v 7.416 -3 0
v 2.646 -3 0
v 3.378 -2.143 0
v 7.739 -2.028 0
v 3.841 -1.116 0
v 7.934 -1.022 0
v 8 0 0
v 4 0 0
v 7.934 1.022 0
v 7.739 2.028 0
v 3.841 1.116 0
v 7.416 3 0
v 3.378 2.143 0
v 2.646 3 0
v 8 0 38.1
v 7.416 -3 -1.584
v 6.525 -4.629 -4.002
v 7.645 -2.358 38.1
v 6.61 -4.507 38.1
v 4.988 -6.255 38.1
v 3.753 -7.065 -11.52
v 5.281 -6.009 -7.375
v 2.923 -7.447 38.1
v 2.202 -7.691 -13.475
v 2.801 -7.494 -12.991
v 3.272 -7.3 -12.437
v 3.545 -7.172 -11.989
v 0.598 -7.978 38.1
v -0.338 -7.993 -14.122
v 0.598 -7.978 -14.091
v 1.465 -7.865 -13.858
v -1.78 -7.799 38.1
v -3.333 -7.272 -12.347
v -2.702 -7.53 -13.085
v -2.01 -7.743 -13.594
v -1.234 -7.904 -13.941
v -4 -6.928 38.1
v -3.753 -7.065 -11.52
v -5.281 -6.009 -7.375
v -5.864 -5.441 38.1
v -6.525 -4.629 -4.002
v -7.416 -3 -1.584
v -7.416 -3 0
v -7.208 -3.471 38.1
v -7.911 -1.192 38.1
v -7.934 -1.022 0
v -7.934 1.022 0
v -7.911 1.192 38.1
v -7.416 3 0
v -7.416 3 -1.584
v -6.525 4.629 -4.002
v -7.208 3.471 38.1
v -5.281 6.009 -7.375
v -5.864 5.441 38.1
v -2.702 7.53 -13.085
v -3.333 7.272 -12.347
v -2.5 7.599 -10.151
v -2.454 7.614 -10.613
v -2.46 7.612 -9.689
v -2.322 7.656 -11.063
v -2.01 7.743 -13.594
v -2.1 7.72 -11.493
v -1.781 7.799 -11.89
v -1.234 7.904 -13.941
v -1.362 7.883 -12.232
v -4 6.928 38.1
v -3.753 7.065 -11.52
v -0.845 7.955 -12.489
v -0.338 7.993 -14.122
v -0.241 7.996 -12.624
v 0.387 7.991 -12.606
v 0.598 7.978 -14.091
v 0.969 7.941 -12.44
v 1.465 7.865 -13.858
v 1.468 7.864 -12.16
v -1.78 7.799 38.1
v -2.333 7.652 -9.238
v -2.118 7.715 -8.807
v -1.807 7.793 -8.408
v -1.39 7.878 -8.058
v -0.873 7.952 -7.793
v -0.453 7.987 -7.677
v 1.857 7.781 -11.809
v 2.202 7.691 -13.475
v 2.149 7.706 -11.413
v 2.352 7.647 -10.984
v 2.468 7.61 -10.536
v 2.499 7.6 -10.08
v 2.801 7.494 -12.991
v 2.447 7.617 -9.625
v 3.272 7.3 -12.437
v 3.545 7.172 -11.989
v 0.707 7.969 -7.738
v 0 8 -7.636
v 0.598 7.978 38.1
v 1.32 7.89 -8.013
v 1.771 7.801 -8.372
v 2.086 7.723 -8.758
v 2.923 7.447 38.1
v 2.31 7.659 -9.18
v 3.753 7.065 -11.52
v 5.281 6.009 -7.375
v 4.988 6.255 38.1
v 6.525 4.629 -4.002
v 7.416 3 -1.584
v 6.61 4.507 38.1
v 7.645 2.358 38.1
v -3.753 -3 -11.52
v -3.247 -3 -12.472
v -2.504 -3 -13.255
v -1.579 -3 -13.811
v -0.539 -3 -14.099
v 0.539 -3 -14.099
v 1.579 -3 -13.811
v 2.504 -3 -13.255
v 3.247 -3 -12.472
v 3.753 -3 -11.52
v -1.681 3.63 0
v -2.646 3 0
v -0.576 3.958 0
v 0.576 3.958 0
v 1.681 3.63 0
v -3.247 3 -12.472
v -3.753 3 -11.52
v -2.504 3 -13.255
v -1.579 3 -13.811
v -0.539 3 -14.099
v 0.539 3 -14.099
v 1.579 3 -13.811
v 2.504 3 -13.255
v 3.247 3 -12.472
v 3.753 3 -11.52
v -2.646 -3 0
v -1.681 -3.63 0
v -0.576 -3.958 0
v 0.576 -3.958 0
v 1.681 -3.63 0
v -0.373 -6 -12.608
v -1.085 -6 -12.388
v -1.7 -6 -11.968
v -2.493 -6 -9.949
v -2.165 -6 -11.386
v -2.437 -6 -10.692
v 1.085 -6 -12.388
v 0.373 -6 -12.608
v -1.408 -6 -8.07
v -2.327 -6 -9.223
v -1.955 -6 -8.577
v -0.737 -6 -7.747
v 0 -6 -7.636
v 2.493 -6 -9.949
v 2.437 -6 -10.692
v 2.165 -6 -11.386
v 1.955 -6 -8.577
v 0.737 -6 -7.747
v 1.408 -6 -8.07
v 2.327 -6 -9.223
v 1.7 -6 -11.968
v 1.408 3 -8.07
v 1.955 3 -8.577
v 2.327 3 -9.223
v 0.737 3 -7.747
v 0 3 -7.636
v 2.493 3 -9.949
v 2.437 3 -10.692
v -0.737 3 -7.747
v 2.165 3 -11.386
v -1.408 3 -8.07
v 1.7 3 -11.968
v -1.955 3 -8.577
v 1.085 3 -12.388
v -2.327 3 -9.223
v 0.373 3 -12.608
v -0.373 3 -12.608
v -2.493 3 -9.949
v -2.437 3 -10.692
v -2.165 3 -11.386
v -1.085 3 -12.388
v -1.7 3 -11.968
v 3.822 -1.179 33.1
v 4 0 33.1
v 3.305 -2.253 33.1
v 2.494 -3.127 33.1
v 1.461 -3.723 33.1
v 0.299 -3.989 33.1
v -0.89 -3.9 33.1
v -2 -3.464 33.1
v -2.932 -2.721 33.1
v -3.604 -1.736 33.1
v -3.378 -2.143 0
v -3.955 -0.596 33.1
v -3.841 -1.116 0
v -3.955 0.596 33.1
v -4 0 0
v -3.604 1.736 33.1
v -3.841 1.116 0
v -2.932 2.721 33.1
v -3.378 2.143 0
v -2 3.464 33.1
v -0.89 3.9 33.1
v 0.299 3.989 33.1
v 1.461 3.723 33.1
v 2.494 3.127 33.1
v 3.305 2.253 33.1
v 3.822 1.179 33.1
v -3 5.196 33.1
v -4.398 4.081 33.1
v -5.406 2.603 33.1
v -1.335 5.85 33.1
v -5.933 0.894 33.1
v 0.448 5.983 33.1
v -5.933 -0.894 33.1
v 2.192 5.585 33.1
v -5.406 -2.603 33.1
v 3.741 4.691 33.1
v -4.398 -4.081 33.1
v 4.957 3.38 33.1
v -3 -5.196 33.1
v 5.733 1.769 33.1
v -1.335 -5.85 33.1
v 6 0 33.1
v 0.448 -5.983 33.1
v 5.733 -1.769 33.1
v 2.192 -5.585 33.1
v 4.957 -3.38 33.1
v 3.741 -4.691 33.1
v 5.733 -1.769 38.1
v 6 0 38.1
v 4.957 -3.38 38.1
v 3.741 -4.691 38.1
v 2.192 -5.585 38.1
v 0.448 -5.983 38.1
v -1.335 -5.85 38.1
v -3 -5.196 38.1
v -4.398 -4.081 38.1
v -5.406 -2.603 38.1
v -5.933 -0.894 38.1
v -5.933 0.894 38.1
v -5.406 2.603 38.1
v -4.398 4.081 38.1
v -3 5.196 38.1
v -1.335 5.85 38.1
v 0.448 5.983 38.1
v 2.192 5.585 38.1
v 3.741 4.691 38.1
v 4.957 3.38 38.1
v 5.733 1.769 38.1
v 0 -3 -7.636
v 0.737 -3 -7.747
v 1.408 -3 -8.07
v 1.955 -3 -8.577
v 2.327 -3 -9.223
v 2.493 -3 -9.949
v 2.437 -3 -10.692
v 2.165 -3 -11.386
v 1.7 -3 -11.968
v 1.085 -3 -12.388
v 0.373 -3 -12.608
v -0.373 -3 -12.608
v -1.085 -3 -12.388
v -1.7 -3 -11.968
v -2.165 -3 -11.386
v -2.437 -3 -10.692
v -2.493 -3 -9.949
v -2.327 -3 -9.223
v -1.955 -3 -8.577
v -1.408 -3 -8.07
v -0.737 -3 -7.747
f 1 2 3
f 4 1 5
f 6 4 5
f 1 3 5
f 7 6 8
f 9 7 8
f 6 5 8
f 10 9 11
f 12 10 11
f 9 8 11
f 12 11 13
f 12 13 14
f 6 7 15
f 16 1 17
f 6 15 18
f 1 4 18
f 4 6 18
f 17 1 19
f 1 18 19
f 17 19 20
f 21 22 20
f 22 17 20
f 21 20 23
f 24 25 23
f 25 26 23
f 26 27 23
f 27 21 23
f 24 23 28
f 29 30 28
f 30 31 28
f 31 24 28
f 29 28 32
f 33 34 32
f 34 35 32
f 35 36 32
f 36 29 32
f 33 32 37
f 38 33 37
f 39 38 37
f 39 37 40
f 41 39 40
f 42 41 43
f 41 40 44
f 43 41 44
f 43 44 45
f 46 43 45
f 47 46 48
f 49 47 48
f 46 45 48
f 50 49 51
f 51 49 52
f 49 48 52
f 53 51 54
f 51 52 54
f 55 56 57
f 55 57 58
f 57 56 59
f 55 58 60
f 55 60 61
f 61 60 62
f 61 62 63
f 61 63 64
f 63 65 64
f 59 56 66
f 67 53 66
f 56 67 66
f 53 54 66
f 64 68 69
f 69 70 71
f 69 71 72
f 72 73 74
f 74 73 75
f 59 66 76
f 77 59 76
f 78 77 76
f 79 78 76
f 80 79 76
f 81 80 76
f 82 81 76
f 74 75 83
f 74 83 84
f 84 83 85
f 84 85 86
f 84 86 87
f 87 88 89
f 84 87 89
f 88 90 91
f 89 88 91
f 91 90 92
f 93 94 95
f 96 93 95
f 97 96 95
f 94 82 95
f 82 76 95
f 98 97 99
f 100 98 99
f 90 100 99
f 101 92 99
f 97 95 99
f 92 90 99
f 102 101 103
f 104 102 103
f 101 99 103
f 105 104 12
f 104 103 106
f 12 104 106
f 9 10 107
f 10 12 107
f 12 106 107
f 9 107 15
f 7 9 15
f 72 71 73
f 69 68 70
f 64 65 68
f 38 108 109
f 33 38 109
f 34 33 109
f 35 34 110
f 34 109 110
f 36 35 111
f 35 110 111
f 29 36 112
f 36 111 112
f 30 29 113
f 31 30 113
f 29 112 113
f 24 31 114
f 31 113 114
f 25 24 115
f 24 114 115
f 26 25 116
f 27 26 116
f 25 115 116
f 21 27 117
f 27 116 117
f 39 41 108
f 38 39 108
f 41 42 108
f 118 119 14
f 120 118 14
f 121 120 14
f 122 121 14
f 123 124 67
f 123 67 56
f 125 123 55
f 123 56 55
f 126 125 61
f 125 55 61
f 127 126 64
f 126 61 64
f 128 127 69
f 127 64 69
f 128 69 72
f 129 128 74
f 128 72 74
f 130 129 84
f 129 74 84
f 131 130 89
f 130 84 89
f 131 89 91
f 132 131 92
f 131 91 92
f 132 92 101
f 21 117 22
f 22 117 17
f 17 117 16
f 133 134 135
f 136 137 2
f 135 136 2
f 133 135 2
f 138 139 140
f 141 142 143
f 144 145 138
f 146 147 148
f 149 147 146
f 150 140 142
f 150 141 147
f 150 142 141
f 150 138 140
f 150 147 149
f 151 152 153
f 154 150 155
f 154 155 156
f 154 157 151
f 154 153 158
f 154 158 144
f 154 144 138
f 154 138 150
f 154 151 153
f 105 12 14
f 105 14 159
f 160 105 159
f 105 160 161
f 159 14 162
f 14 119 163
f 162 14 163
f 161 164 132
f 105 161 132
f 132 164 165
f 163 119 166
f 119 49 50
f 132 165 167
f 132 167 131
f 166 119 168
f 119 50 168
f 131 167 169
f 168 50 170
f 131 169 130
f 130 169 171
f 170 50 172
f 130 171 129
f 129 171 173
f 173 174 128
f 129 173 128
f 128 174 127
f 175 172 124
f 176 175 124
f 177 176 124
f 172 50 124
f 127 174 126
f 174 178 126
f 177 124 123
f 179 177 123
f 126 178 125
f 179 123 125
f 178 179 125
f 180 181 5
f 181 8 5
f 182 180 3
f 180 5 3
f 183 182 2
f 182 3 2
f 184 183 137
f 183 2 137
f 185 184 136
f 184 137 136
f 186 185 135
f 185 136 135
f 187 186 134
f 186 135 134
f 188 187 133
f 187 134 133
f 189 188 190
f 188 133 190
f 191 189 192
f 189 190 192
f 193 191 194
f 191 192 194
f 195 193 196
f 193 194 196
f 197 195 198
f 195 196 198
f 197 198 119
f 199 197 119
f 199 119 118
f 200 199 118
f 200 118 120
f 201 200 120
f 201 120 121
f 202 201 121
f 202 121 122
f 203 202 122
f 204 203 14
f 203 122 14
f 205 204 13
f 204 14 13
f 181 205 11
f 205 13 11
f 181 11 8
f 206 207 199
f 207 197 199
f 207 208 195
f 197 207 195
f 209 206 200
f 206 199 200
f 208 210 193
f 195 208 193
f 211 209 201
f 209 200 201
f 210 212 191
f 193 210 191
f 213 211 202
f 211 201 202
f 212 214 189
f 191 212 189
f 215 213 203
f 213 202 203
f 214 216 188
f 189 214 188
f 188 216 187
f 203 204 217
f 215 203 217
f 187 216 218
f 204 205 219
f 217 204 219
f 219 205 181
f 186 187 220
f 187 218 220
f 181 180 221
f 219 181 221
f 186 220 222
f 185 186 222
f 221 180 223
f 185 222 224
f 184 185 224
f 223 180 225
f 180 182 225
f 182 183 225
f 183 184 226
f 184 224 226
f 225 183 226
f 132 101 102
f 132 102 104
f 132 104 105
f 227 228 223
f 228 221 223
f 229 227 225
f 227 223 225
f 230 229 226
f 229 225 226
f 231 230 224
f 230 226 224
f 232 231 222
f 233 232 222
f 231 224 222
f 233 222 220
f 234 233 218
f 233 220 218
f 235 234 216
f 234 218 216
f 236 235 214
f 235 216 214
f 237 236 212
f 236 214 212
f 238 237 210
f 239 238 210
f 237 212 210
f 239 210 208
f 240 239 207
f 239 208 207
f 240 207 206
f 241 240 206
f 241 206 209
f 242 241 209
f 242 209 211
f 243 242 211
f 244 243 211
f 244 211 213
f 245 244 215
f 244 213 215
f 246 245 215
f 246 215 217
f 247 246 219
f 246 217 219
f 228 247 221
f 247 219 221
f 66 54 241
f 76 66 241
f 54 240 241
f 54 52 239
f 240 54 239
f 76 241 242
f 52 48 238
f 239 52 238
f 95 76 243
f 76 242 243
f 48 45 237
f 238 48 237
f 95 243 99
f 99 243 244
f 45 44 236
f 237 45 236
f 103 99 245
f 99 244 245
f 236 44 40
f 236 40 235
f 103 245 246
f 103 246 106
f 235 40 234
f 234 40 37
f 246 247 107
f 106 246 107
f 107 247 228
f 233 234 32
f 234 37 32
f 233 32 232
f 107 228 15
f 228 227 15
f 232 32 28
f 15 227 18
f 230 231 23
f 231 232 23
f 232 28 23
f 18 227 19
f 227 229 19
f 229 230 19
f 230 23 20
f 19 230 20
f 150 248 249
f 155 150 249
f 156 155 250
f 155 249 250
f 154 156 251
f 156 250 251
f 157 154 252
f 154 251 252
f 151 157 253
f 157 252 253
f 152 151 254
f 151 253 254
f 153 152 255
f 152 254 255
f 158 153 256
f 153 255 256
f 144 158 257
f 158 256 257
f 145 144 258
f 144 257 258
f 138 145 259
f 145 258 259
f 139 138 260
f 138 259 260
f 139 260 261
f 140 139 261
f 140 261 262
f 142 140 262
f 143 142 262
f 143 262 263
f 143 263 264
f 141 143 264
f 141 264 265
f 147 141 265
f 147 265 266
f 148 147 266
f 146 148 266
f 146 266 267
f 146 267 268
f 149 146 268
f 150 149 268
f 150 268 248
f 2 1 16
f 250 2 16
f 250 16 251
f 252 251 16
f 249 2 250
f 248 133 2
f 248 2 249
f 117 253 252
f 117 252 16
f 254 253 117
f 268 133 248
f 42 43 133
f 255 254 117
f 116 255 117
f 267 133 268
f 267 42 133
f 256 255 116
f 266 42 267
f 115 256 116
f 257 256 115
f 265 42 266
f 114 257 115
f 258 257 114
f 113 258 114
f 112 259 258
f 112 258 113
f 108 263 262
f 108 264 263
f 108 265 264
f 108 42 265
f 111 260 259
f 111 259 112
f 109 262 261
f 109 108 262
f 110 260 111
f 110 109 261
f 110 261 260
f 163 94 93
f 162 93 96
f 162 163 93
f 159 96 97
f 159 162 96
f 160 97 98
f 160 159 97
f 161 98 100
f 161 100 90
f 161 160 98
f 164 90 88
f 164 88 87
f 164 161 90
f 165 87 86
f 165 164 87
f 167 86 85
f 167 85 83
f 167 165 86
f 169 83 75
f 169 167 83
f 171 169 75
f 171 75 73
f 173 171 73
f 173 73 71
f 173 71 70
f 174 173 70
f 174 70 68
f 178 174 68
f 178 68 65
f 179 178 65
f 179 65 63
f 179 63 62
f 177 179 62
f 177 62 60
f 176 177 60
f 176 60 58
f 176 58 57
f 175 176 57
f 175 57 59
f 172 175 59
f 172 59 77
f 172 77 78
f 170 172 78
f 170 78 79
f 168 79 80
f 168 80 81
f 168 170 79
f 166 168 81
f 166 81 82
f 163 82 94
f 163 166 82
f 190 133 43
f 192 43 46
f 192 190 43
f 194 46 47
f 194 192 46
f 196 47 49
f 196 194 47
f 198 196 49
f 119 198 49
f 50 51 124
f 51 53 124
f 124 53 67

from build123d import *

# Parameters (mm, degrees)
CUT_EXTRUDE2_DEPTH      = 40.744307769
CUT_EXTRUDE2_DEPTH_BACK = 40.744307769
SKETCH4_W               = 25.011127608
SKETCH4_H               = 6
CUT_EXTRUDE3_DEPTH      = 40.744307905
CUT_EXTRUDE3_DEPTH_BACK = 40.744307905
SKETCH3_4_R             = 2.5
CUT_EXTRUDE4_DEPTH      = 40.744307905
CUT_EXTRUDE4_DEPTH_BACK = 6


with BuildPart() as part:
    # Sketch2 → Revolve1 (revolve)
    with BuildSketch(Plane(origin=(0, 0, 0), x_dir=(0, 0, -1), z_dir=(1, 0, 0)), mode=Mode.PRIVATE) as revolve1_sk:
        Polygon((-33.1, 4), (0, 4), (0, 3), (20, 3), (20, 8), (-38.1, 8), (-38.1, 6), (-33.1, 6), align=None)
    revolve(revolve1_sk.sketch.rotate(Axis((0, 0, 12.975169934), (0, 0, -1)), 90), axis=Axis((0, 0, 12.975169934), (0, 0, -1)))

    # Sketch3 → Cut-Extrude2 (cut, two sides)
    with BuildSketch(Plane(origin=(0, 0, 0), x_dir=(1, 0, 0), z_dir=(0, 1, 0))) as cut_extrude2_sk:
        with BuildLine():
            Line((8, 0), (8, 25))
            Line((8, 25), (-8, 25))
            Line((-8, 25), (-8, 0))
            Line((-8, 0), (-3.753065966, 11.519523043))
            ThreePointArc((-3.753065966, 11.519523043), (0, 14.13586996), (3.753065966, 11.519523043))
            Line((3.753065966, 11.519523043), (8, 0))
        make_face()
    extrude(amount=CUT_EXTRUDE2_DEPTH, mode=Mode.SUBTRACT)
    extrude(cut_extrude2_sk.sketch, amount=-CUT_EXTRUDE2_DEPTH_BACK, mode=Mode.SUBTRACT)

    # Sketch4 → Cut-Extrude3 (cut, two sides)
    with BuildSketch(Plane(origin=(0, 0, 0), x_dir=(0, 0, -1), z_dir=(1, 0, 0))) as cut_extrude3_sk:
        with Locations((12.505563804, 0)):
            Rectangle(SKETCH4_W, SKETCH4_H)
    extrude(amount=CUT_EXTRUDE3_DEPTH, mode=Mode.SUBTRACT)
    extrude(cut_extrude3_sk.sketch, amount=-CUT_EXTRUDE3_DEPTH_BACK, mode=Mode.SUBTRACT)

    # Sketch3<4> → Cut-Extrude4 (cut, two sides)
    with BuildSketch(Plane(origin=(0, 0, 0), x_dir=(1, 0, 0), z_dir=(0, 1, 0))) as cut_extrude4_sk:
        with Locations(Location((0, 10.13586996, 0), (0, 0, 270))):
            Circle(SKETCH3_4_R)
    extrude(amount=CUT_EXTRUDE4_DEPTH, mode=Mode.SUBTRACT)
    extrude(cut_extrude4_sk.sketch, amount=-CUT_EXTRUDE4_DEPTH_BACK, mode=Mode.SUBTRACT)


solid = part.part
